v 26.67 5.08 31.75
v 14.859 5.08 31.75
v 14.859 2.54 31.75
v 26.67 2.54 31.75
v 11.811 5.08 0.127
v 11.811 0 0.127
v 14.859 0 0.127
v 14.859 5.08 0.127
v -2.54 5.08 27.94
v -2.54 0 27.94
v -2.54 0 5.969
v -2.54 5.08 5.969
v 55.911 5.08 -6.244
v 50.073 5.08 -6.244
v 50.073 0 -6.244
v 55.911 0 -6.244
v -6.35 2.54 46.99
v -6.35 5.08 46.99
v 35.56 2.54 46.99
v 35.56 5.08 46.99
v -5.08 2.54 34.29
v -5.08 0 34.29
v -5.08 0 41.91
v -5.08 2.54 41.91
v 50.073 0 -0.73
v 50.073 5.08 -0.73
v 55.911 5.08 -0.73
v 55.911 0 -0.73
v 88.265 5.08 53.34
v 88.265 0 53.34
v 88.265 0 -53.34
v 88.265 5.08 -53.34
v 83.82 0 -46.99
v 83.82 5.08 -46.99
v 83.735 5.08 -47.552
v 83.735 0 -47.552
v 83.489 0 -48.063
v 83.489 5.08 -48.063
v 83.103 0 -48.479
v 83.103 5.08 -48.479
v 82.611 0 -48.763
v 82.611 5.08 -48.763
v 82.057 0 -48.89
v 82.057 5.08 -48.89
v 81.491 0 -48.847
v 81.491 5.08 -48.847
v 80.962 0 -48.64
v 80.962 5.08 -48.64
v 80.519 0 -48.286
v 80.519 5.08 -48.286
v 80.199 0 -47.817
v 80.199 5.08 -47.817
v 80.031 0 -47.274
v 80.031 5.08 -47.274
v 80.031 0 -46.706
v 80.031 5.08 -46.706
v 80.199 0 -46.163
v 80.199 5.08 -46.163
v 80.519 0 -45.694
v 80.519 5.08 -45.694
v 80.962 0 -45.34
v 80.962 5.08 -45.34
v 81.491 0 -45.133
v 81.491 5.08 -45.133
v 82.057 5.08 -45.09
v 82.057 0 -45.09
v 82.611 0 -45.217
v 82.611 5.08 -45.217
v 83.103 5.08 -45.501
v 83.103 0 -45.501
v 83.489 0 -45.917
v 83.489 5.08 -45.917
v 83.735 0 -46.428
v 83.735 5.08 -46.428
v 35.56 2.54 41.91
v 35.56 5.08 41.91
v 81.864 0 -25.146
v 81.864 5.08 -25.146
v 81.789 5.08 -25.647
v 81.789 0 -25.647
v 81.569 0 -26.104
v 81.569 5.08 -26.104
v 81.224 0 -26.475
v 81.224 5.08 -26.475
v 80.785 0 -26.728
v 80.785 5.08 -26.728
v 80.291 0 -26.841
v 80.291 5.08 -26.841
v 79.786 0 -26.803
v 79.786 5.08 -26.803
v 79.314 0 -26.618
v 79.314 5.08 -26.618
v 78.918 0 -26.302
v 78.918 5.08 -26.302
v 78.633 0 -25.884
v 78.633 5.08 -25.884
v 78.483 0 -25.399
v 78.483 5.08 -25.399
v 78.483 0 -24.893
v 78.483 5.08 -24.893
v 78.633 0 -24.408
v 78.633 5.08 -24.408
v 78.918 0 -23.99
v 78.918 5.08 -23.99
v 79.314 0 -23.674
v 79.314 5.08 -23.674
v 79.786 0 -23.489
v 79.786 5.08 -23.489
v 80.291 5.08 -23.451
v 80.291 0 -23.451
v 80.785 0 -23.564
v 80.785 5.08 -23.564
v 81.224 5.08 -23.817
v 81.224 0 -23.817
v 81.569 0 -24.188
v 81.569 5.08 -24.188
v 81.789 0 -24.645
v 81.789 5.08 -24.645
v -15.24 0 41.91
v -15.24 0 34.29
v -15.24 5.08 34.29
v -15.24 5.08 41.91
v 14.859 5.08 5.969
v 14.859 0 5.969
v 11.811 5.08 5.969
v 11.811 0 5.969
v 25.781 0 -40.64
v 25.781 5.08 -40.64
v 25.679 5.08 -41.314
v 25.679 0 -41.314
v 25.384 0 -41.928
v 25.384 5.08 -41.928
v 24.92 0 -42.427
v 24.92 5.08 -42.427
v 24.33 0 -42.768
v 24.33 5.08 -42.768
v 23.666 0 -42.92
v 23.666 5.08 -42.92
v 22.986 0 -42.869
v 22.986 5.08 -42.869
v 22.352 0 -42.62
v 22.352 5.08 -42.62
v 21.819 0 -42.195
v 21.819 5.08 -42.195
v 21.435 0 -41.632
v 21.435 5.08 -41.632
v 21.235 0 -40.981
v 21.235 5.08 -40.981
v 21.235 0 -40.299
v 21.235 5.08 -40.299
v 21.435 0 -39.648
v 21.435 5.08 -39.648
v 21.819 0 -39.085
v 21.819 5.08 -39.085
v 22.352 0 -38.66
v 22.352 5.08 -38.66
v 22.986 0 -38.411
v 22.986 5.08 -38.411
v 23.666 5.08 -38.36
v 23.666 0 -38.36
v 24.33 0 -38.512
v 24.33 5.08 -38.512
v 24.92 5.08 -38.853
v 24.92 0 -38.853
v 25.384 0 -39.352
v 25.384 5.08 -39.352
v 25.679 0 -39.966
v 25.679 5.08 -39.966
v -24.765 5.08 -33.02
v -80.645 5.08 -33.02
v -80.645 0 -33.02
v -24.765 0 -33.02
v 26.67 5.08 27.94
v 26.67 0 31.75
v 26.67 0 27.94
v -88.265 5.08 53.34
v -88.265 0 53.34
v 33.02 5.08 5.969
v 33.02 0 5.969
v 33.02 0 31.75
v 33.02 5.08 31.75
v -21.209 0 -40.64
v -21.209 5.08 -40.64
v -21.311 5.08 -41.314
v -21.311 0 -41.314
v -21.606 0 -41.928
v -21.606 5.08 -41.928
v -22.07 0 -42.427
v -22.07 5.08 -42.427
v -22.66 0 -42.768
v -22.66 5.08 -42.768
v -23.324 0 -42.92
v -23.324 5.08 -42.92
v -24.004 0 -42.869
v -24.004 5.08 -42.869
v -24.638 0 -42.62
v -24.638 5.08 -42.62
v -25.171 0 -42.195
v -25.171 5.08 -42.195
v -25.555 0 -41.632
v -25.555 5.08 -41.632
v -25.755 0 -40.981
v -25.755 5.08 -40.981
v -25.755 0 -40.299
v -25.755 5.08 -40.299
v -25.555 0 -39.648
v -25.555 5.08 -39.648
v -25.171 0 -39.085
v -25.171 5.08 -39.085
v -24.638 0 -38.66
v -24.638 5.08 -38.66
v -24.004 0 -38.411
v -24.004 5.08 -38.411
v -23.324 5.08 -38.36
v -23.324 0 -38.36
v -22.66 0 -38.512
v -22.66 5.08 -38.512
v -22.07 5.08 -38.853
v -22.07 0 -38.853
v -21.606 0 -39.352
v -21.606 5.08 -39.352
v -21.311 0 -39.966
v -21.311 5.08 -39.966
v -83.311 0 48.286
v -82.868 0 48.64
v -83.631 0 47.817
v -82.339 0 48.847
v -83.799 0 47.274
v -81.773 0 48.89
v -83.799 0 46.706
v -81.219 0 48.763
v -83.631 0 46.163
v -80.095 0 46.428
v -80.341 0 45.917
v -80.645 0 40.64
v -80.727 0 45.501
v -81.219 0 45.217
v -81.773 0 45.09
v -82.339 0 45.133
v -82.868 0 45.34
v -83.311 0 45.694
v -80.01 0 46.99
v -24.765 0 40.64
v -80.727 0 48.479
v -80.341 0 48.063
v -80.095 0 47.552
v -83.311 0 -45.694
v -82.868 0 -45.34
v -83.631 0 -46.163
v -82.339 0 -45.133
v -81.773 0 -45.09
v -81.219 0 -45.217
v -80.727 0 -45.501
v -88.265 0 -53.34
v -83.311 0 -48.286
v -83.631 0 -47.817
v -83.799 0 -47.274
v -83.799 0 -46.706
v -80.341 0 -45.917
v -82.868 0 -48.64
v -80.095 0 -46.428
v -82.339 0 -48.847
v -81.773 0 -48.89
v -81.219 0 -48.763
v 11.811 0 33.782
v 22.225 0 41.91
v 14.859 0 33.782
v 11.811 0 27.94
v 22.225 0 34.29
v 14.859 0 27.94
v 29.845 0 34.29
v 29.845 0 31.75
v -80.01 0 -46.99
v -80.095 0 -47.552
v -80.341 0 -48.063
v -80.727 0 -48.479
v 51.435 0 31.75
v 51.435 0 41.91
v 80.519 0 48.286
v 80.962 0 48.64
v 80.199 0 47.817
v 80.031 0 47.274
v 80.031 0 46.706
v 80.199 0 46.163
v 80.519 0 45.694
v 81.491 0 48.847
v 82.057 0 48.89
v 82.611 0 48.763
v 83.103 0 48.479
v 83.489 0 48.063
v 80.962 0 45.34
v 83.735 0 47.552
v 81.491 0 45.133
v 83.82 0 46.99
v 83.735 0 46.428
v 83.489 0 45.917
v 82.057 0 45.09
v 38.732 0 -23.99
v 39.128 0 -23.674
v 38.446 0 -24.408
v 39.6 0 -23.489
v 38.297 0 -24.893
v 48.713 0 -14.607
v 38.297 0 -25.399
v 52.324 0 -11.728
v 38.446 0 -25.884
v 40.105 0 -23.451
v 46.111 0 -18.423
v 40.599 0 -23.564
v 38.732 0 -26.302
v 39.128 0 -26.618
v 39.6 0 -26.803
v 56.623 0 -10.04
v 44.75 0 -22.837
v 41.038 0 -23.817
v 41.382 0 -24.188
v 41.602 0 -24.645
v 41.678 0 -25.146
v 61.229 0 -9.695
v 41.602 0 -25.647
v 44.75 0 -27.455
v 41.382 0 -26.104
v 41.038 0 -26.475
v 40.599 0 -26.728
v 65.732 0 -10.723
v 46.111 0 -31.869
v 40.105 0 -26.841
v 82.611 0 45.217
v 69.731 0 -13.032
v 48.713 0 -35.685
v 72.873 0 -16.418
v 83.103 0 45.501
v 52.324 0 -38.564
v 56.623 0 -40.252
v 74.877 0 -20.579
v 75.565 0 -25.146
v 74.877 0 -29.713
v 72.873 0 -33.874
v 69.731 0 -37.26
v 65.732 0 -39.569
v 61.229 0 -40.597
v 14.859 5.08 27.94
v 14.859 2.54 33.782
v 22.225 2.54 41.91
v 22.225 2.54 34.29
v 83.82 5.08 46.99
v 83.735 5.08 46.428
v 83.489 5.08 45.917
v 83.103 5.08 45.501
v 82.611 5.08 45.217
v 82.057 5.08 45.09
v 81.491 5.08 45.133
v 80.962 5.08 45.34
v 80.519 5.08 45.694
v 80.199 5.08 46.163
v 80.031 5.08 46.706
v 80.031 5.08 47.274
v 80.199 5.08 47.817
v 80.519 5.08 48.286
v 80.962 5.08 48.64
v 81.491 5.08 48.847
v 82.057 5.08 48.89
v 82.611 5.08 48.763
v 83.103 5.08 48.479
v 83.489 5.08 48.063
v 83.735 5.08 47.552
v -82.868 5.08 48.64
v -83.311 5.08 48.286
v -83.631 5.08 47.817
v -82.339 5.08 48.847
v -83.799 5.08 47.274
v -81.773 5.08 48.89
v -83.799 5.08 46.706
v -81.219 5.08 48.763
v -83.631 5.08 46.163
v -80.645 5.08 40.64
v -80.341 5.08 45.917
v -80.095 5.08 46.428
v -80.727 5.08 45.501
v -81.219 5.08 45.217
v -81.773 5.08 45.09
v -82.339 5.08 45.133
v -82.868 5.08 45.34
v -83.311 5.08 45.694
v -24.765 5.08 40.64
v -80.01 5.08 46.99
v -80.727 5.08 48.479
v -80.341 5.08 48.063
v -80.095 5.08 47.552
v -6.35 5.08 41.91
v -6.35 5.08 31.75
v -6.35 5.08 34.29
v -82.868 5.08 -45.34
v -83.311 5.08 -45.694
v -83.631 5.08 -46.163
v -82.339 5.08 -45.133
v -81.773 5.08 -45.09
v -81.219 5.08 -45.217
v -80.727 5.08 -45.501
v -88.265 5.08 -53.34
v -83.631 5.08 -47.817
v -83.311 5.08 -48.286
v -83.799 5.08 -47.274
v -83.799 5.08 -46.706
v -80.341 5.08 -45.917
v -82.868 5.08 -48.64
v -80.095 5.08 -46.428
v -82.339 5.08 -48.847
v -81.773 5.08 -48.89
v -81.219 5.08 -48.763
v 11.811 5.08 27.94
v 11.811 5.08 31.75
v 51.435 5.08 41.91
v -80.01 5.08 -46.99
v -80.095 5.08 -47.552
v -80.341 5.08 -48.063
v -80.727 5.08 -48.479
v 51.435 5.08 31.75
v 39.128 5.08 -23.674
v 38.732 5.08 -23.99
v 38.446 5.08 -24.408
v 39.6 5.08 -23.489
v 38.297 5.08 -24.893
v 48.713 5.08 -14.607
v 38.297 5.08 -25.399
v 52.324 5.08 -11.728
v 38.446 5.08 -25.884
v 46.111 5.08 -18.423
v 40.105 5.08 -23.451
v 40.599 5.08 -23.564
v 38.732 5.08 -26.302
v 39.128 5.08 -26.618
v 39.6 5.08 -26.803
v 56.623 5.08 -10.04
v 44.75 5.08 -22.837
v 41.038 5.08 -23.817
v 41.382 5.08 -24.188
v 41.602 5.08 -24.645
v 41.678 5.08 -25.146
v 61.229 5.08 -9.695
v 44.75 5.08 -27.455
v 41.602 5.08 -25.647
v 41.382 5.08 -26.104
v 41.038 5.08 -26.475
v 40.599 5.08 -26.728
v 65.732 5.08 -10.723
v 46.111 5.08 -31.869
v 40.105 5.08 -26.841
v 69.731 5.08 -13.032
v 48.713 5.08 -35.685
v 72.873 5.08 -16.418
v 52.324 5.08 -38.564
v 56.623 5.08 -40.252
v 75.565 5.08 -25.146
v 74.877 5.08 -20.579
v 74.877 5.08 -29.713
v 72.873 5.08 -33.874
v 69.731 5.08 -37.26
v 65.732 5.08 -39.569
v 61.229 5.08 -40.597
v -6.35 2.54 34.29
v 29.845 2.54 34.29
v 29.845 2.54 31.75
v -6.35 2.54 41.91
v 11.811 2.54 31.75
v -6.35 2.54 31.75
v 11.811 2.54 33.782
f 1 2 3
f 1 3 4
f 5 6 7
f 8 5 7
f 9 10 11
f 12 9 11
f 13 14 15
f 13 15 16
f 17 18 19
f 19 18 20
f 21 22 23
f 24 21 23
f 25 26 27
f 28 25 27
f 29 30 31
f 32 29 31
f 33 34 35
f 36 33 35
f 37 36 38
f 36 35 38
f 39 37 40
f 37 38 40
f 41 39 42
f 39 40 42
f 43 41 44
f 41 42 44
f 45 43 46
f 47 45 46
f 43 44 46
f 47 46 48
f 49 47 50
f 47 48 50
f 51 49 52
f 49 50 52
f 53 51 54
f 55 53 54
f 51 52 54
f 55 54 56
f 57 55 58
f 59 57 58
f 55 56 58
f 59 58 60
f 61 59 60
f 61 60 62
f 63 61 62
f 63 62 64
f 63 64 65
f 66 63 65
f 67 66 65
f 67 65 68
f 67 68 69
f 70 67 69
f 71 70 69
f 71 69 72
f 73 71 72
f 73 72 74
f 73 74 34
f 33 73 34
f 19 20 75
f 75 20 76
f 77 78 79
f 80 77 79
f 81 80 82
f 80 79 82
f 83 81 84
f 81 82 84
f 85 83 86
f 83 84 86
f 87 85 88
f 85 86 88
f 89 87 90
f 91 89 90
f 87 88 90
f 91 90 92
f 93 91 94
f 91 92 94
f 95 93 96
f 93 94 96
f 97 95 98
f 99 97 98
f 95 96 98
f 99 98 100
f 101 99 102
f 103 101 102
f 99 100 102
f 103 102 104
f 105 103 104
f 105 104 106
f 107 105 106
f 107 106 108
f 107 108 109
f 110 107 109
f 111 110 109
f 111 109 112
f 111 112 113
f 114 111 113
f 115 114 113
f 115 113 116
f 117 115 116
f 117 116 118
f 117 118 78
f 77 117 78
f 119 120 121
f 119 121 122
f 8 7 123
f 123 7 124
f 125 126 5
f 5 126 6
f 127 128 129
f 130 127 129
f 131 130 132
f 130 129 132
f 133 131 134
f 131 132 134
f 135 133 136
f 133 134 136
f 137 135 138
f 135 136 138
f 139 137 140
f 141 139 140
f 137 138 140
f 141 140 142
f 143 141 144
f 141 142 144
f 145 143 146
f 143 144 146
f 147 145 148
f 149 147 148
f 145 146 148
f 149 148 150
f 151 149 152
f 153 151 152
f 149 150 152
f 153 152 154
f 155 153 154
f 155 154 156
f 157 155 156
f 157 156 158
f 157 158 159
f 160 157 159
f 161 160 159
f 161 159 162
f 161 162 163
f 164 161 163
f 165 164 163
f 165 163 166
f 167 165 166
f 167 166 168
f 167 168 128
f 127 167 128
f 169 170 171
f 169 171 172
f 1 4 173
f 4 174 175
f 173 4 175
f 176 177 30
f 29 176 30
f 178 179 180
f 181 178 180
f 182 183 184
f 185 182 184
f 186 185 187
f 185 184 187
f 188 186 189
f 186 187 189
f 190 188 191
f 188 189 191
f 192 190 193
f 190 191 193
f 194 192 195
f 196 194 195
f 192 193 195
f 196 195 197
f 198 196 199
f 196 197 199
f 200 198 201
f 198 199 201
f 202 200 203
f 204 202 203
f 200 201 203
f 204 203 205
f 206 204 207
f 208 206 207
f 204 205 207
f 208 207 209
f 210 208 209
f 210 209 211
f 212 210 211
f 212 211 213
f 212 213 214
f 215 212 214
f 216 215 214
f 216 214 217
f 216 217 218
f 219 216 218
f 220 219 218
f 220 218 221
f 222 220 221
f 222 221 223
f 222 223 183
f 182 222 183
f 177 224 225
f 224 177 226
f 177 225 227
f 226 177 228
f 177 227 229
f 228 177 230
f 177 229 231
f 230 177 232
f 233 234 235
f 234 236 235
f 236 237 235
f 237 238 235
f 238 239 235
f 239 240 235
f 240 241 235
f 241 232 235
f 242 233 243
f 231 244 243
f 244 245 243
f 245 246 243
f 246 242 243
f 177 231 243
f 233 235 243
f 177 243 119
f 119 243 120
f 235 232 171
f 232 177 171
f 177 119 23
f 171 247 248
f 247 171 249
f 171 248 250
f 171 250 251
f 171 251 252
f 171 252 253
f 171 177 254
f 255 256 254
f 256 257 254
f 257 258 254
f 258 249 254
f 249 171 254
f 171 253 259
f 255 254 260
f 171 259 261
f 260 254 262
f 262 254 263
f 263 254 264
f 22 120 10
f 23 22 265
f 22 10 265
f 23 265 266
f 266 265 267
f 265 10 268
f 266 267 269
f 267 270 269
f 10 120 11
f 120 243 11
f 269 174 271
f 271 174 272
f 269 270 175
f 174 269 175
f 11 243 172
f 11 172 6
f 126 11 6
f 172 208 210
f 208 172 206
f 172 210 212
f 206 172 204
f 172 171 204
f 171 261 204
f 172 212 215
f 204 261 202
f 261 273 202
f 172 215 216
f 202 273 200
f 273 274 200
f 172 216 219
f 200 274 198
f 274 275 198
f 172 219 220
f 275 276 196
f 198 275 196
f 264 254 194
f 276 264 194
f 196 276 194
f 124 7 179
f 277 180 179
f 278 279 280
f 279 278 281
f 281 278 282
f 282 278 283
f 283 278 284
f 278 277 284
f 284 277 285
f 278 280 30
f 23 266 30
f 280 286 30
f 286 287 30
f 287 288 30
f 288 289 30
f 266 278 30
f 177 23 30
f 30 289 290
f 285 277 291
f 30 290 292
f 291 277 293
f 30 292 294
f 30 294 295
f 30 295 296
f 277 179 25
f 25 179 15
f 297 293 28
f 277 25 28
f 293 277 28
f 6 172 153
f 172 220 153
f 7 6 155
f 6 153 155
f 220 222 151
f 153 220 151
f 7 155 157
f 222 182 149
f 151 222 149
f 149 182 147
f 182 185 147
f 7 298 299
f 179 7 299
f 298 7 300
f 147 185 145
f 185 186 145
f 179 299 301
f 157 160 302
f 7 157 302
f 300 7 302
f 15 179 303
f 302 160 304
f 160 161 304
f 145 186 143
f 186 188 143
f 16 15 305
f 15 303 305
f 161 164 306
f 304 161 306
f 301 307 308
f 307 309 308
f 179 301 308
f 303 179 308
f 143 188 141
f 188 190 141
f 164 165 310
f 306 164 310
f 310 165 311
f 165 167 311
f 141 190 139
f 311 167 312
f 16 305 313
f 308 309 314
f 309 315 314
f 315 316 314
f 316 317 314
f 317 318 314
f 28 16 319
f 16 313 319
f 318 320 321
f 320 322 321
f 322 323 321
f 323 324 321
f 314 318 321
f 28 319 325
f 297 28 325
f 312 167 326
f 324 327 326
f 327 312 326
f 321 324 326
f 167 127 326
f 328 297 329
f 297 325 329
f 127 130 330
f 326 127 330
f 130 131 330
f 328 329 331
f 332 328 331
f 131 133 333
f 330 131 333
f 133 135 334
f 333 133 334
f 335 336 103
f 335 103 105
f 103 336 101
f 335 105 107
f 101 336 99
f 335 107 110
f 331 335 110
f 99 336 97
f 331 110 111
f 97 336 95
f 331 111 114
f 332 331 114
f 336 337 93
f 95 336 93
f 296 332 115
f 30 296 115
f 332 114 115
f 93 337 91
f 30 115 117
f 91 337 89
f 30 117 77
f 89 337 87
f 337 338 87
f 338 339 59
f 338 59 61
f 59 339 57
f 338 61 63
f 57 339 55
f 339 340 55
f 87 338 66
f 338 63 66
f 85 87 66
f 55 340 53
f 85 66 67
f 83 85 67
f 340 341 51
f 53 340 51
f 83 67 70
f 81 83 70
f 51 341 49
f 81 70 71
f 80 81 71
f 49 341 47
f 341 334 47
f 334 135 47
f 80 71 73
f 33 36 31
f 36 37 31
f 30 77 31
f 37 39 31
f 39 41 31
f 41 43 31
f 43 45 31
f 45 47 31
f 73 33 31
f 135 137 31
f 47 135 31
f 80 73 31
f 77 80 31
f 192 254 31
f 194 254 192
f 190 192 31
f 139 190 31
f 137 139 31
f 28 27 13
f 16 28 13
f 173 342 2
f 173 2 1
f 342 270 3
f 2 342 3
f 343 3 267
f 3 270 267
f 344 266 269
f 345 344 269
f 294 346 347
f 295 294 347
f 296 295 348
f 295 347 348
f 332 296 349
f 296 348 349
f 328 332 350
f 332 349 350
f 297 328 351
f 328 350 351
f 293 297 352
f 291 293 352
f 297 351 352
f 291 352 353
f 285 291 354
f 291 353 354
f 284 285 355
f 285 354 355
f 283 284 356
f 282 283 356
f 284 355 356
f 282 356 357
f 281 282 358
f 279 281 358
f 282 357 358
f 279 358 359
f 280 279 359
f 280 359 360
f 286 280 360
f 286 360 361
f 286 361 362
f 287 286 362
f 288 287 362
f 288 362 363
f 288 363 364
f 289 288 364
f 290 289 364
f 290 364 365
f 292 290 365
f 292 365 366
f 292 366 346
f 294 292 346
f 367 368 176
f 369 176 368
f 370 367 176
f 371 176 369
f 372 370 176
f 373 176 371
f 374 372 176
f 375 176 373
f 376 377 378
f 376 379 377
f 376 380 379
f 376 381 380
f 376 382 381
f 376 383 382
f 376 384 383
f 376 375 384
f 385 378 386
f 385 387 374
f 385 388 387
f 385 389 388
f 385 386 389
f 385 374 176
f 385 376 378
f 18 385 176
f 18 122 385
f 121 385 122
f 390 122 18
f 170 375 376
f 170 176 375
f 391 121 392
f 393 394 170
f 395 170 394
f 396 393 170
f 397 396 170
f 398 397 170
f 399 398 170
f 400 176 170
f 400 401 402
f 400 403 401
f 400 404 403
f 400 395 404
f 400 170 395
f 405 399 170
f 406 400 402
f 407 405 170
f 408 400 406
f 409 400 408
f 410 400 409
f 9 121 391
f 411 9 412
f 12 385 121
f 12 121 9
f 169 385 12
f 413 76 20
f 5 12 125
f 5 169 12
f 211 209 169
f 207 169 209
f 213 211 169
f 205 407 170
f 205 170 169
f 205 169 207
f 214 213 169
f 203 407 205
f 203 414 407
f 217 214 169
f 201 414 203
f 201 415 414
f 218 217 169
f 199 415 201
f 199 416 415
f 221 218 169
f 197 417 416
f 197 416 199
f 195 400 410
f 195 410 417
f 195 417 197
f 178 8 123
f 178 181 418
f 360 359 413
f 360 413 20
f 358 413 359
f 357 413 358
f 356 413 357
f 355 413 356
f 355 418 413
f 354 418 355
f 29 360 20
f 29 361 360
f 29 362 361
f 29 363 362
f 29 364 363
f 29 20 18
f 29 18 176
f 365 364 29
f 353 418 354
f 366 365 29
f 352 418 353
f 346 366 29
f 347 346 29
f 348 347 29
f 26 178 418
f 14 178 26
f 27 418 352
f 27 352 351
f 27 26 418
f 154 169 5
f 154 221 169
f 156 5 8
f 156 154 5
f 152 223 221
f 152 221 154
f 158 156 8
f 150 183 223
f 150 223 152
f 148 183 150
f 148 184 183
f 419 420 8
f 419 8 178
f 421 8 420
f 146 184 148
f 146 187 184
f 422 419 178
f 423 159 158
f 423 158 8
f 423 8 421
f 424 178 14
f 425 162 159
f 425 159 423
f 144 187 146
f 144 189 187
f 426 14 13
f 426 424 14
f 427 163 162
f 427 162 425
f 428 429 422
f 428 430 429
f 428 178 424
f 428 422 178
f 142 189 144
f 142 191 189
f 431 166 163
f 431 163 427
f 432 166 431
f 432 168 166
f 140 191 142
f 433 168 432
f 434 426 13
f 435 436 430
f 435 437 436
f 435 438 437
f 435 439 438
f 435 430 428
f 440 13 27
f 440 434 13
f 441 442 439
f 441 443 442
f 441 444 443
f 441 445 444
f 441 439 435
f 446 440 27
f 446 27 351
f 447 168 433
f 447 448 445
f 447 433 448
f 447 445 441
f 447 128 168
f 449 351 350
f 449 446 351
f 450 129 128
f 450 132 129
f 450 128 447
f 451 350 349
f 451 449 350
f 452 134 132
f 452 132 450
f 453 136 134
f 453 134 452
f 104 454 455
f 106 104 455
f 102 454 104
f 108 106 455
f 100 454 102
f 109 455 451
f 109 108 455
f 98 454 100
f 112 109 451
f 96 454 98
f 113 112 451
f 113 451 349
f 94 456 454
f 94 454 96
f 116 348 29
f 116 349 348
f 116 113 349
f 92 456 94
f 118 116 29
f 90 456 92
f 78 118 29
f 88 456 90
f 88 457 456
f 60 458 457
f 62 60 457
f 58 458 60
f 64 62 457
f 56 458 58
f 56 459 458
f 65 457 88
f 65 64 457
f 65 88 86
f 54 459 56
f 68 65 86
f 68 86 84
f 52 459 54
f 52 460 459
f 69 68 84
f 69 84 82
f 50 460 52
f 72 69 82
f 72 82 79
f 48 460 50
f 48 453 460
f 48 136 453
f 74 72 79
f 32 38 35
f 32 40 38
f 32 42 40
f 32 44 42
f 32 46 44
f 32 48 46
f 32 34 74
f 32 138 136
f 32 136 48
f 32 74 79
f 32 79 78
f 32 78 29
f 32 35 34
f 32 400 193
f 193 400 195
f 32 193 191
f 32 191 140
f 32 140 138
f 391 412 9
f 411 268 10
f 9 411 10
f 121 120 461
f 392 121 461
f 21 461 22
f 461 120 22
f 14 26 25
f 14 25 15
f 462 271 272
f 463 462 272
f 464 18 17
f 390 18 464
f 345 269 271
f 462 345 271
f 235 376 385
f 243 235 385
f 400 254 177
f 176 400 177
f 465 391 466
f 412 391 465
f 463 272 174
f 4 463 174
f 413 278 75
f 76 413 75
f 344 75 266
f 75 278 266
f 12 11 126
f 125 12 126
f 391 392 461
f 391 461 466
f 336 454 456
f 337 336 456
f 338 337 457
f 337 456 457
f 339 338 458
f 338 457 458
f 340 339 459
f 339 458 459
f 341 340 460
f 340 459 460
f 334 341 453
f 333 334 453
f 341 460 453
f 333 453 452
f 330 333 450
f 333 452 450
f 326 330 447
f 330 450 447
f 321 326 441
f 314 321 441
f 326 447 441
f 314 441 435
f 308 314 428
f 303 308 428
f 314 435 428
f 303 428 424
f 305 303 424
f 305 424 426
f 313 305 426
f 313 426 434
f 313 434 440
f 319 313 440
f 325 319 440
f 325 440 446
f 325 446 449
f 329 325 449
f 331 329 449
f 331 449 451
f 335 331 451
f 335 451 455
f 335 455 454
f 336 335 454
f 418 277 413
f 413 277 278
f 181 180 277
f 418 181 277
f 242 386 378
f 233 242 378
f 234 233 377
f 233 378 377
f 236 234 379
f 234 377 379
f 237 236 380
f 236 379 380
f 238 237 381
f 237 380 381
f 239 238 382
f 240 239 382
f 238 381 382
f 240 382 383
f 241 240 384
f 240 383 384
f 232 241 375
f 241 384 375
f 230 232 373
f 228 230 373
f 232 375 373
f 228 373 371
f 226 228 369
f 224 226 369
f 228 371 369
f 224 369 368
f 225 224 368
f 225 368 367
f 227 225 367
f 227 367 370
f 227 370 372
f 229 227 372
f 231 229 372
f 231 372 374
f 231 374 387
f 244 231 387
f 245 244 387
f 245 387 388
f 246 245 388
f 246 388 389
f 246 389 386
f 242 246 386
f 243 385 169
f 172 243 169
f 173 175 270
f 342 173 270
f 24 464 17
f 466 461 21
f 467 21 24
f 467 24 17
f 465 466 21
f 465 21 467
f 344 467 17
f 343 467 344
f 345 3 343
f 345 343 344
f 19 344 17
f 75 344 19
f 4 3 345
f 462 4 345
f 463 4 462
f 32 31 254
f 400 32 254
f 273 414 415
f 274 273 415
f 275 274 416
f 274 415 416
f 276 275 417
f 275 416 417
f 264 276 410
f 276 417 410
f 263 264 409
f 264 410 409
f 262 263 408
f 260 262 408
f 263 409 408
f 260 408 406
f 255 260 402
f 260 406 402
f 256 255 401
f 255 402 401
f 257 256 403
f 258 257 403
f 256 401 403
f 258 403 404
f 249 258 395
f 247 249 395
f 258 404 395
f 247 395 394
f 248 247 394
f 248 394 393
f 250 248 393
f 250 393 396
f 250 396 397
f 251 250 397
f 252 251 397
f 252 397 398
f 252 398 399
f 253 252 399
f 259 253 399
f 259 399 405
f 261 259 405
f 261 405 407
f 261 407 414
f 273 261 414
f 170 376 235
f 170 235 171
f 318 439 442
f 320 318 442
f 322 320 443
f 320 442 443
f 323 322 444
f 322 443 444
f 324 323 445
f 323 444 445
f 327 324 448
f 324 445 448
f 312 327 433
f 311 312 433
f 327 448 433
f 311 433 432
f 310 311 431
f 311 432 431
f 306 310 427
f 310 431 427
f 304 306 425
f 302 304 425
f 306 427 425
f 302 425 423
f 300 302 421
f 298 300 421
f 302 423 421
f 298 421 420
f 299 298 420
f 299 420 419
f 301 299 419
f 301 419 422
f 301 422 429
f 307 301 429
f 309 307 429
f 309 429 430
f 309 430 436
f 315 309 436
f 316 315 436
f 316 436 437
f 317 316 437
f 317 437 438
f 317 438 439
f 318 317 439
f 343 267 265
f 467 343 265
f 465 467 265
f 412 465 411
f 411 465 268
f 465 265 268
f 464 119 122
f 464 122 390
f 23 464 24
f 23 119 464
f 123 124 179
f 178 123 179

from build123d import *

# Parameters (mm, degrees)
BOSS_EXTRUDE1_DEPTH = 5.08
SKETCH3_R           = 1.905
CUT_EXTRUDE1_DEPTH  = 6.08
SKETCH4_R           = 1.905
SKETCH4_R_2         = 2.286
CUT_EXTRUDE2_DEPTH  = 6.08
CUT_EXTRUDE3_DEPTH  = 6.08
SKETCH6_R           = 15.494
SKETCH6_R_2         = 1.7
CUT_EXTRUDE4_DEPTH  = 6.08
SKETCH7_W           = 55.88
SKETCH7_H           = 73.66
CUT_EXTRUDE5_DEPTH  = 6.08
SKETCH8_W           = 5.838418679
SKETCH8_H           = 5.514062087
CUT_EXTRUDE6_DEPTH  = 6.08
CUT_EXTRUDE7_DEPTH  = 6.08
SKETCH12_W          = 10.16
SKETCH12_H          = 7.62
CUT_EXTRUDE8_DEPTH  = 6.08
SKETCH13_W          = 41.91
SKETCH13_H          = 15.24
CUT_EXTRUDE9_DEPTH  = 2.54


with BuildPart() as part:
    # Sketch1 → Boss-Extrude1 (new body)
    with BuildSketch(Plane(origin=(0, 0, 0), x_dir=(1, 0, 0), z_dir=(0, 1, 0))):
        Polygon((-15.621, -53.34), (15.621, -53.34), (88.265, -53.34), (88.265, 53.34), (-88.265, 53.34), (-88.265, -53.34), align=None)
    extrude(amount=BOSS_EXTRUDE1_DEPTH)

    # Sketch3 → Cut-Extrude1 (cut, through all)
    with BuildSketch(Plane(origin=(0, 5.08, 0), x_dir=(1, 0, 0), z_dir=(0, 1, 0))):
        with Locations((-81.915, 46.99)):
            Circle(SKETCH3_R)
    extrude(amount=-CUT_EXTRUDE1_DEPTH, mode=Mode.SUBTRACT)

    # Sketch4 → Cut-Extrude2 (cut, through all)
    with BuildSketch(Plane(origin=(0, 5.08, 0), x_dir=(1, 0, 0), z_dir=(0, 1, 0))):
        with Locations((81.915, 46.99)):
            Circle(SKETCH4_R)
        with Locations((-81.915, -46.99)):
            Circle(SKETCH4_R)
        with Locations((81.915, -46.99)):
            Circle(SKETCH4_R)
        with Locations((23.495, 40.64)):
            Circle(SKETCH4_R_2)
        with Locations((-23.495, 40.64)):
            Circle(SKETCH4_R_2)
    extrude(amount=-CUT_EXTRUDE2_DEPTH, mode=Mode.SUBTRACT)

    # Sketch5 → Cut-Extrude3 (cut, through all)
    with BuildSketch(Plane.XZ):
        Polygon((-2.54, 27.94), (-2.54, 5.969), (11.811, 5.969), (11.811, 0.127), (14.859, 0.127), (14.859, 5.969), (33.02, 5.969), (33.02, 29.21), (33.02, 31.75), (26.67, 31.75), (26.67, 27.94), (25.80916534, 27.94), (14.859, 27.94), (14.859, 33.782), (11.811, 33.782), (11.811, 27.94), align=None)
    extrude(amount=-CUT_EXTRUDE3_DEPTH, mode=Mode.SUBTRACT)

    # Sketch6 → Cut-Extrude4 (cut, through all)
    with BuildSketch(Plane(origin=(0, 5.08, 0), x_dir=(1, 0, 0), z_dir=(0, 1, 0))):
        with Locations((60.071, 25.146)):
            Circle(SKETCH6_R)
        with Locations((39.9778, 25.146)):
            Circle(SKETCH6_R_2)
        with Locations((80.1642, 25.146)):
            Circle(SKETCH6_R_2)
    extrude(amount=-CUT_EXTRUDE4_DEPTH, mode=Mode.SUBTRACT)

    # Sketch7 → Cut-Extrude5 (cut, through all)
    with BuildSketch(Plane(origin=(0, 5.08, 0), x_dir=(1, 0, 0), z_dir=(0, 1, 0))):
        with Locations((-52.705, -3.81)):
            Rectangle(SKETCH7_W, SKETCH7_H)
    extrude(amount=-CUT_EXTRUDE5_DEPTH, mode=Mode.SUBTRACT)

    # Sketch8 → Cut-Extrude6 (cut, through all)
    with BuildSketch(Plane(origin=(0, 5.08, 0), x_dir=(1, 0, 0), z_dir=(0, 1, 0))):
        with Locations((52.991758435, 3.486833379)):
            Rectangle(SKETCH8_W, SKETCH8_H)
    extrude(amount=-CUT_EXTRUDE6_DEPTH, mode=Mode.SUBTRACT)

    # Sketch11 → Cut-Extrude7 (cut, through all)
    with BuildSketch(Plane.XZ):
        Polygon((29.845, 31.75), (51.435, 31.75), (51.435, 41.91), (29.845, 41.91), (22.225, 41.91), (22.225, 34.29), (29.845, 34.29), align=None)
    extrude(amount=-CUT_EXTRUDE7_DEPTH, mode=Mode.SUBTRACT)

    # Sketch12 → Cut-Extrude8 (cut, through all)
    with BuildSketch(Plane.XZ):
        with Locations((-10.16, 38.1)):
            Rectangle(SKETCH12_W, SKETCH12_H)
    extrude(amount=-CUT_EXTRUDE8_DEPTH, mode=Mode.SUBTRACT)

    # Sketch13 → Cut-Extrude9 (cut)
    with BuildSketch(Plane(origin=(0, 5.08, 0), x_dir=(1, 0, 0), z_dir=(0, 1, 0))):
        with Locations((14.605, -39.37)):
            Rectangle(SKETCH13_W, SKETCH13_H)
    extrude(amount=-CUT_EXTRUDE9_DEPTH, mode=Mode.SUBTRACT)


solid = part.part
